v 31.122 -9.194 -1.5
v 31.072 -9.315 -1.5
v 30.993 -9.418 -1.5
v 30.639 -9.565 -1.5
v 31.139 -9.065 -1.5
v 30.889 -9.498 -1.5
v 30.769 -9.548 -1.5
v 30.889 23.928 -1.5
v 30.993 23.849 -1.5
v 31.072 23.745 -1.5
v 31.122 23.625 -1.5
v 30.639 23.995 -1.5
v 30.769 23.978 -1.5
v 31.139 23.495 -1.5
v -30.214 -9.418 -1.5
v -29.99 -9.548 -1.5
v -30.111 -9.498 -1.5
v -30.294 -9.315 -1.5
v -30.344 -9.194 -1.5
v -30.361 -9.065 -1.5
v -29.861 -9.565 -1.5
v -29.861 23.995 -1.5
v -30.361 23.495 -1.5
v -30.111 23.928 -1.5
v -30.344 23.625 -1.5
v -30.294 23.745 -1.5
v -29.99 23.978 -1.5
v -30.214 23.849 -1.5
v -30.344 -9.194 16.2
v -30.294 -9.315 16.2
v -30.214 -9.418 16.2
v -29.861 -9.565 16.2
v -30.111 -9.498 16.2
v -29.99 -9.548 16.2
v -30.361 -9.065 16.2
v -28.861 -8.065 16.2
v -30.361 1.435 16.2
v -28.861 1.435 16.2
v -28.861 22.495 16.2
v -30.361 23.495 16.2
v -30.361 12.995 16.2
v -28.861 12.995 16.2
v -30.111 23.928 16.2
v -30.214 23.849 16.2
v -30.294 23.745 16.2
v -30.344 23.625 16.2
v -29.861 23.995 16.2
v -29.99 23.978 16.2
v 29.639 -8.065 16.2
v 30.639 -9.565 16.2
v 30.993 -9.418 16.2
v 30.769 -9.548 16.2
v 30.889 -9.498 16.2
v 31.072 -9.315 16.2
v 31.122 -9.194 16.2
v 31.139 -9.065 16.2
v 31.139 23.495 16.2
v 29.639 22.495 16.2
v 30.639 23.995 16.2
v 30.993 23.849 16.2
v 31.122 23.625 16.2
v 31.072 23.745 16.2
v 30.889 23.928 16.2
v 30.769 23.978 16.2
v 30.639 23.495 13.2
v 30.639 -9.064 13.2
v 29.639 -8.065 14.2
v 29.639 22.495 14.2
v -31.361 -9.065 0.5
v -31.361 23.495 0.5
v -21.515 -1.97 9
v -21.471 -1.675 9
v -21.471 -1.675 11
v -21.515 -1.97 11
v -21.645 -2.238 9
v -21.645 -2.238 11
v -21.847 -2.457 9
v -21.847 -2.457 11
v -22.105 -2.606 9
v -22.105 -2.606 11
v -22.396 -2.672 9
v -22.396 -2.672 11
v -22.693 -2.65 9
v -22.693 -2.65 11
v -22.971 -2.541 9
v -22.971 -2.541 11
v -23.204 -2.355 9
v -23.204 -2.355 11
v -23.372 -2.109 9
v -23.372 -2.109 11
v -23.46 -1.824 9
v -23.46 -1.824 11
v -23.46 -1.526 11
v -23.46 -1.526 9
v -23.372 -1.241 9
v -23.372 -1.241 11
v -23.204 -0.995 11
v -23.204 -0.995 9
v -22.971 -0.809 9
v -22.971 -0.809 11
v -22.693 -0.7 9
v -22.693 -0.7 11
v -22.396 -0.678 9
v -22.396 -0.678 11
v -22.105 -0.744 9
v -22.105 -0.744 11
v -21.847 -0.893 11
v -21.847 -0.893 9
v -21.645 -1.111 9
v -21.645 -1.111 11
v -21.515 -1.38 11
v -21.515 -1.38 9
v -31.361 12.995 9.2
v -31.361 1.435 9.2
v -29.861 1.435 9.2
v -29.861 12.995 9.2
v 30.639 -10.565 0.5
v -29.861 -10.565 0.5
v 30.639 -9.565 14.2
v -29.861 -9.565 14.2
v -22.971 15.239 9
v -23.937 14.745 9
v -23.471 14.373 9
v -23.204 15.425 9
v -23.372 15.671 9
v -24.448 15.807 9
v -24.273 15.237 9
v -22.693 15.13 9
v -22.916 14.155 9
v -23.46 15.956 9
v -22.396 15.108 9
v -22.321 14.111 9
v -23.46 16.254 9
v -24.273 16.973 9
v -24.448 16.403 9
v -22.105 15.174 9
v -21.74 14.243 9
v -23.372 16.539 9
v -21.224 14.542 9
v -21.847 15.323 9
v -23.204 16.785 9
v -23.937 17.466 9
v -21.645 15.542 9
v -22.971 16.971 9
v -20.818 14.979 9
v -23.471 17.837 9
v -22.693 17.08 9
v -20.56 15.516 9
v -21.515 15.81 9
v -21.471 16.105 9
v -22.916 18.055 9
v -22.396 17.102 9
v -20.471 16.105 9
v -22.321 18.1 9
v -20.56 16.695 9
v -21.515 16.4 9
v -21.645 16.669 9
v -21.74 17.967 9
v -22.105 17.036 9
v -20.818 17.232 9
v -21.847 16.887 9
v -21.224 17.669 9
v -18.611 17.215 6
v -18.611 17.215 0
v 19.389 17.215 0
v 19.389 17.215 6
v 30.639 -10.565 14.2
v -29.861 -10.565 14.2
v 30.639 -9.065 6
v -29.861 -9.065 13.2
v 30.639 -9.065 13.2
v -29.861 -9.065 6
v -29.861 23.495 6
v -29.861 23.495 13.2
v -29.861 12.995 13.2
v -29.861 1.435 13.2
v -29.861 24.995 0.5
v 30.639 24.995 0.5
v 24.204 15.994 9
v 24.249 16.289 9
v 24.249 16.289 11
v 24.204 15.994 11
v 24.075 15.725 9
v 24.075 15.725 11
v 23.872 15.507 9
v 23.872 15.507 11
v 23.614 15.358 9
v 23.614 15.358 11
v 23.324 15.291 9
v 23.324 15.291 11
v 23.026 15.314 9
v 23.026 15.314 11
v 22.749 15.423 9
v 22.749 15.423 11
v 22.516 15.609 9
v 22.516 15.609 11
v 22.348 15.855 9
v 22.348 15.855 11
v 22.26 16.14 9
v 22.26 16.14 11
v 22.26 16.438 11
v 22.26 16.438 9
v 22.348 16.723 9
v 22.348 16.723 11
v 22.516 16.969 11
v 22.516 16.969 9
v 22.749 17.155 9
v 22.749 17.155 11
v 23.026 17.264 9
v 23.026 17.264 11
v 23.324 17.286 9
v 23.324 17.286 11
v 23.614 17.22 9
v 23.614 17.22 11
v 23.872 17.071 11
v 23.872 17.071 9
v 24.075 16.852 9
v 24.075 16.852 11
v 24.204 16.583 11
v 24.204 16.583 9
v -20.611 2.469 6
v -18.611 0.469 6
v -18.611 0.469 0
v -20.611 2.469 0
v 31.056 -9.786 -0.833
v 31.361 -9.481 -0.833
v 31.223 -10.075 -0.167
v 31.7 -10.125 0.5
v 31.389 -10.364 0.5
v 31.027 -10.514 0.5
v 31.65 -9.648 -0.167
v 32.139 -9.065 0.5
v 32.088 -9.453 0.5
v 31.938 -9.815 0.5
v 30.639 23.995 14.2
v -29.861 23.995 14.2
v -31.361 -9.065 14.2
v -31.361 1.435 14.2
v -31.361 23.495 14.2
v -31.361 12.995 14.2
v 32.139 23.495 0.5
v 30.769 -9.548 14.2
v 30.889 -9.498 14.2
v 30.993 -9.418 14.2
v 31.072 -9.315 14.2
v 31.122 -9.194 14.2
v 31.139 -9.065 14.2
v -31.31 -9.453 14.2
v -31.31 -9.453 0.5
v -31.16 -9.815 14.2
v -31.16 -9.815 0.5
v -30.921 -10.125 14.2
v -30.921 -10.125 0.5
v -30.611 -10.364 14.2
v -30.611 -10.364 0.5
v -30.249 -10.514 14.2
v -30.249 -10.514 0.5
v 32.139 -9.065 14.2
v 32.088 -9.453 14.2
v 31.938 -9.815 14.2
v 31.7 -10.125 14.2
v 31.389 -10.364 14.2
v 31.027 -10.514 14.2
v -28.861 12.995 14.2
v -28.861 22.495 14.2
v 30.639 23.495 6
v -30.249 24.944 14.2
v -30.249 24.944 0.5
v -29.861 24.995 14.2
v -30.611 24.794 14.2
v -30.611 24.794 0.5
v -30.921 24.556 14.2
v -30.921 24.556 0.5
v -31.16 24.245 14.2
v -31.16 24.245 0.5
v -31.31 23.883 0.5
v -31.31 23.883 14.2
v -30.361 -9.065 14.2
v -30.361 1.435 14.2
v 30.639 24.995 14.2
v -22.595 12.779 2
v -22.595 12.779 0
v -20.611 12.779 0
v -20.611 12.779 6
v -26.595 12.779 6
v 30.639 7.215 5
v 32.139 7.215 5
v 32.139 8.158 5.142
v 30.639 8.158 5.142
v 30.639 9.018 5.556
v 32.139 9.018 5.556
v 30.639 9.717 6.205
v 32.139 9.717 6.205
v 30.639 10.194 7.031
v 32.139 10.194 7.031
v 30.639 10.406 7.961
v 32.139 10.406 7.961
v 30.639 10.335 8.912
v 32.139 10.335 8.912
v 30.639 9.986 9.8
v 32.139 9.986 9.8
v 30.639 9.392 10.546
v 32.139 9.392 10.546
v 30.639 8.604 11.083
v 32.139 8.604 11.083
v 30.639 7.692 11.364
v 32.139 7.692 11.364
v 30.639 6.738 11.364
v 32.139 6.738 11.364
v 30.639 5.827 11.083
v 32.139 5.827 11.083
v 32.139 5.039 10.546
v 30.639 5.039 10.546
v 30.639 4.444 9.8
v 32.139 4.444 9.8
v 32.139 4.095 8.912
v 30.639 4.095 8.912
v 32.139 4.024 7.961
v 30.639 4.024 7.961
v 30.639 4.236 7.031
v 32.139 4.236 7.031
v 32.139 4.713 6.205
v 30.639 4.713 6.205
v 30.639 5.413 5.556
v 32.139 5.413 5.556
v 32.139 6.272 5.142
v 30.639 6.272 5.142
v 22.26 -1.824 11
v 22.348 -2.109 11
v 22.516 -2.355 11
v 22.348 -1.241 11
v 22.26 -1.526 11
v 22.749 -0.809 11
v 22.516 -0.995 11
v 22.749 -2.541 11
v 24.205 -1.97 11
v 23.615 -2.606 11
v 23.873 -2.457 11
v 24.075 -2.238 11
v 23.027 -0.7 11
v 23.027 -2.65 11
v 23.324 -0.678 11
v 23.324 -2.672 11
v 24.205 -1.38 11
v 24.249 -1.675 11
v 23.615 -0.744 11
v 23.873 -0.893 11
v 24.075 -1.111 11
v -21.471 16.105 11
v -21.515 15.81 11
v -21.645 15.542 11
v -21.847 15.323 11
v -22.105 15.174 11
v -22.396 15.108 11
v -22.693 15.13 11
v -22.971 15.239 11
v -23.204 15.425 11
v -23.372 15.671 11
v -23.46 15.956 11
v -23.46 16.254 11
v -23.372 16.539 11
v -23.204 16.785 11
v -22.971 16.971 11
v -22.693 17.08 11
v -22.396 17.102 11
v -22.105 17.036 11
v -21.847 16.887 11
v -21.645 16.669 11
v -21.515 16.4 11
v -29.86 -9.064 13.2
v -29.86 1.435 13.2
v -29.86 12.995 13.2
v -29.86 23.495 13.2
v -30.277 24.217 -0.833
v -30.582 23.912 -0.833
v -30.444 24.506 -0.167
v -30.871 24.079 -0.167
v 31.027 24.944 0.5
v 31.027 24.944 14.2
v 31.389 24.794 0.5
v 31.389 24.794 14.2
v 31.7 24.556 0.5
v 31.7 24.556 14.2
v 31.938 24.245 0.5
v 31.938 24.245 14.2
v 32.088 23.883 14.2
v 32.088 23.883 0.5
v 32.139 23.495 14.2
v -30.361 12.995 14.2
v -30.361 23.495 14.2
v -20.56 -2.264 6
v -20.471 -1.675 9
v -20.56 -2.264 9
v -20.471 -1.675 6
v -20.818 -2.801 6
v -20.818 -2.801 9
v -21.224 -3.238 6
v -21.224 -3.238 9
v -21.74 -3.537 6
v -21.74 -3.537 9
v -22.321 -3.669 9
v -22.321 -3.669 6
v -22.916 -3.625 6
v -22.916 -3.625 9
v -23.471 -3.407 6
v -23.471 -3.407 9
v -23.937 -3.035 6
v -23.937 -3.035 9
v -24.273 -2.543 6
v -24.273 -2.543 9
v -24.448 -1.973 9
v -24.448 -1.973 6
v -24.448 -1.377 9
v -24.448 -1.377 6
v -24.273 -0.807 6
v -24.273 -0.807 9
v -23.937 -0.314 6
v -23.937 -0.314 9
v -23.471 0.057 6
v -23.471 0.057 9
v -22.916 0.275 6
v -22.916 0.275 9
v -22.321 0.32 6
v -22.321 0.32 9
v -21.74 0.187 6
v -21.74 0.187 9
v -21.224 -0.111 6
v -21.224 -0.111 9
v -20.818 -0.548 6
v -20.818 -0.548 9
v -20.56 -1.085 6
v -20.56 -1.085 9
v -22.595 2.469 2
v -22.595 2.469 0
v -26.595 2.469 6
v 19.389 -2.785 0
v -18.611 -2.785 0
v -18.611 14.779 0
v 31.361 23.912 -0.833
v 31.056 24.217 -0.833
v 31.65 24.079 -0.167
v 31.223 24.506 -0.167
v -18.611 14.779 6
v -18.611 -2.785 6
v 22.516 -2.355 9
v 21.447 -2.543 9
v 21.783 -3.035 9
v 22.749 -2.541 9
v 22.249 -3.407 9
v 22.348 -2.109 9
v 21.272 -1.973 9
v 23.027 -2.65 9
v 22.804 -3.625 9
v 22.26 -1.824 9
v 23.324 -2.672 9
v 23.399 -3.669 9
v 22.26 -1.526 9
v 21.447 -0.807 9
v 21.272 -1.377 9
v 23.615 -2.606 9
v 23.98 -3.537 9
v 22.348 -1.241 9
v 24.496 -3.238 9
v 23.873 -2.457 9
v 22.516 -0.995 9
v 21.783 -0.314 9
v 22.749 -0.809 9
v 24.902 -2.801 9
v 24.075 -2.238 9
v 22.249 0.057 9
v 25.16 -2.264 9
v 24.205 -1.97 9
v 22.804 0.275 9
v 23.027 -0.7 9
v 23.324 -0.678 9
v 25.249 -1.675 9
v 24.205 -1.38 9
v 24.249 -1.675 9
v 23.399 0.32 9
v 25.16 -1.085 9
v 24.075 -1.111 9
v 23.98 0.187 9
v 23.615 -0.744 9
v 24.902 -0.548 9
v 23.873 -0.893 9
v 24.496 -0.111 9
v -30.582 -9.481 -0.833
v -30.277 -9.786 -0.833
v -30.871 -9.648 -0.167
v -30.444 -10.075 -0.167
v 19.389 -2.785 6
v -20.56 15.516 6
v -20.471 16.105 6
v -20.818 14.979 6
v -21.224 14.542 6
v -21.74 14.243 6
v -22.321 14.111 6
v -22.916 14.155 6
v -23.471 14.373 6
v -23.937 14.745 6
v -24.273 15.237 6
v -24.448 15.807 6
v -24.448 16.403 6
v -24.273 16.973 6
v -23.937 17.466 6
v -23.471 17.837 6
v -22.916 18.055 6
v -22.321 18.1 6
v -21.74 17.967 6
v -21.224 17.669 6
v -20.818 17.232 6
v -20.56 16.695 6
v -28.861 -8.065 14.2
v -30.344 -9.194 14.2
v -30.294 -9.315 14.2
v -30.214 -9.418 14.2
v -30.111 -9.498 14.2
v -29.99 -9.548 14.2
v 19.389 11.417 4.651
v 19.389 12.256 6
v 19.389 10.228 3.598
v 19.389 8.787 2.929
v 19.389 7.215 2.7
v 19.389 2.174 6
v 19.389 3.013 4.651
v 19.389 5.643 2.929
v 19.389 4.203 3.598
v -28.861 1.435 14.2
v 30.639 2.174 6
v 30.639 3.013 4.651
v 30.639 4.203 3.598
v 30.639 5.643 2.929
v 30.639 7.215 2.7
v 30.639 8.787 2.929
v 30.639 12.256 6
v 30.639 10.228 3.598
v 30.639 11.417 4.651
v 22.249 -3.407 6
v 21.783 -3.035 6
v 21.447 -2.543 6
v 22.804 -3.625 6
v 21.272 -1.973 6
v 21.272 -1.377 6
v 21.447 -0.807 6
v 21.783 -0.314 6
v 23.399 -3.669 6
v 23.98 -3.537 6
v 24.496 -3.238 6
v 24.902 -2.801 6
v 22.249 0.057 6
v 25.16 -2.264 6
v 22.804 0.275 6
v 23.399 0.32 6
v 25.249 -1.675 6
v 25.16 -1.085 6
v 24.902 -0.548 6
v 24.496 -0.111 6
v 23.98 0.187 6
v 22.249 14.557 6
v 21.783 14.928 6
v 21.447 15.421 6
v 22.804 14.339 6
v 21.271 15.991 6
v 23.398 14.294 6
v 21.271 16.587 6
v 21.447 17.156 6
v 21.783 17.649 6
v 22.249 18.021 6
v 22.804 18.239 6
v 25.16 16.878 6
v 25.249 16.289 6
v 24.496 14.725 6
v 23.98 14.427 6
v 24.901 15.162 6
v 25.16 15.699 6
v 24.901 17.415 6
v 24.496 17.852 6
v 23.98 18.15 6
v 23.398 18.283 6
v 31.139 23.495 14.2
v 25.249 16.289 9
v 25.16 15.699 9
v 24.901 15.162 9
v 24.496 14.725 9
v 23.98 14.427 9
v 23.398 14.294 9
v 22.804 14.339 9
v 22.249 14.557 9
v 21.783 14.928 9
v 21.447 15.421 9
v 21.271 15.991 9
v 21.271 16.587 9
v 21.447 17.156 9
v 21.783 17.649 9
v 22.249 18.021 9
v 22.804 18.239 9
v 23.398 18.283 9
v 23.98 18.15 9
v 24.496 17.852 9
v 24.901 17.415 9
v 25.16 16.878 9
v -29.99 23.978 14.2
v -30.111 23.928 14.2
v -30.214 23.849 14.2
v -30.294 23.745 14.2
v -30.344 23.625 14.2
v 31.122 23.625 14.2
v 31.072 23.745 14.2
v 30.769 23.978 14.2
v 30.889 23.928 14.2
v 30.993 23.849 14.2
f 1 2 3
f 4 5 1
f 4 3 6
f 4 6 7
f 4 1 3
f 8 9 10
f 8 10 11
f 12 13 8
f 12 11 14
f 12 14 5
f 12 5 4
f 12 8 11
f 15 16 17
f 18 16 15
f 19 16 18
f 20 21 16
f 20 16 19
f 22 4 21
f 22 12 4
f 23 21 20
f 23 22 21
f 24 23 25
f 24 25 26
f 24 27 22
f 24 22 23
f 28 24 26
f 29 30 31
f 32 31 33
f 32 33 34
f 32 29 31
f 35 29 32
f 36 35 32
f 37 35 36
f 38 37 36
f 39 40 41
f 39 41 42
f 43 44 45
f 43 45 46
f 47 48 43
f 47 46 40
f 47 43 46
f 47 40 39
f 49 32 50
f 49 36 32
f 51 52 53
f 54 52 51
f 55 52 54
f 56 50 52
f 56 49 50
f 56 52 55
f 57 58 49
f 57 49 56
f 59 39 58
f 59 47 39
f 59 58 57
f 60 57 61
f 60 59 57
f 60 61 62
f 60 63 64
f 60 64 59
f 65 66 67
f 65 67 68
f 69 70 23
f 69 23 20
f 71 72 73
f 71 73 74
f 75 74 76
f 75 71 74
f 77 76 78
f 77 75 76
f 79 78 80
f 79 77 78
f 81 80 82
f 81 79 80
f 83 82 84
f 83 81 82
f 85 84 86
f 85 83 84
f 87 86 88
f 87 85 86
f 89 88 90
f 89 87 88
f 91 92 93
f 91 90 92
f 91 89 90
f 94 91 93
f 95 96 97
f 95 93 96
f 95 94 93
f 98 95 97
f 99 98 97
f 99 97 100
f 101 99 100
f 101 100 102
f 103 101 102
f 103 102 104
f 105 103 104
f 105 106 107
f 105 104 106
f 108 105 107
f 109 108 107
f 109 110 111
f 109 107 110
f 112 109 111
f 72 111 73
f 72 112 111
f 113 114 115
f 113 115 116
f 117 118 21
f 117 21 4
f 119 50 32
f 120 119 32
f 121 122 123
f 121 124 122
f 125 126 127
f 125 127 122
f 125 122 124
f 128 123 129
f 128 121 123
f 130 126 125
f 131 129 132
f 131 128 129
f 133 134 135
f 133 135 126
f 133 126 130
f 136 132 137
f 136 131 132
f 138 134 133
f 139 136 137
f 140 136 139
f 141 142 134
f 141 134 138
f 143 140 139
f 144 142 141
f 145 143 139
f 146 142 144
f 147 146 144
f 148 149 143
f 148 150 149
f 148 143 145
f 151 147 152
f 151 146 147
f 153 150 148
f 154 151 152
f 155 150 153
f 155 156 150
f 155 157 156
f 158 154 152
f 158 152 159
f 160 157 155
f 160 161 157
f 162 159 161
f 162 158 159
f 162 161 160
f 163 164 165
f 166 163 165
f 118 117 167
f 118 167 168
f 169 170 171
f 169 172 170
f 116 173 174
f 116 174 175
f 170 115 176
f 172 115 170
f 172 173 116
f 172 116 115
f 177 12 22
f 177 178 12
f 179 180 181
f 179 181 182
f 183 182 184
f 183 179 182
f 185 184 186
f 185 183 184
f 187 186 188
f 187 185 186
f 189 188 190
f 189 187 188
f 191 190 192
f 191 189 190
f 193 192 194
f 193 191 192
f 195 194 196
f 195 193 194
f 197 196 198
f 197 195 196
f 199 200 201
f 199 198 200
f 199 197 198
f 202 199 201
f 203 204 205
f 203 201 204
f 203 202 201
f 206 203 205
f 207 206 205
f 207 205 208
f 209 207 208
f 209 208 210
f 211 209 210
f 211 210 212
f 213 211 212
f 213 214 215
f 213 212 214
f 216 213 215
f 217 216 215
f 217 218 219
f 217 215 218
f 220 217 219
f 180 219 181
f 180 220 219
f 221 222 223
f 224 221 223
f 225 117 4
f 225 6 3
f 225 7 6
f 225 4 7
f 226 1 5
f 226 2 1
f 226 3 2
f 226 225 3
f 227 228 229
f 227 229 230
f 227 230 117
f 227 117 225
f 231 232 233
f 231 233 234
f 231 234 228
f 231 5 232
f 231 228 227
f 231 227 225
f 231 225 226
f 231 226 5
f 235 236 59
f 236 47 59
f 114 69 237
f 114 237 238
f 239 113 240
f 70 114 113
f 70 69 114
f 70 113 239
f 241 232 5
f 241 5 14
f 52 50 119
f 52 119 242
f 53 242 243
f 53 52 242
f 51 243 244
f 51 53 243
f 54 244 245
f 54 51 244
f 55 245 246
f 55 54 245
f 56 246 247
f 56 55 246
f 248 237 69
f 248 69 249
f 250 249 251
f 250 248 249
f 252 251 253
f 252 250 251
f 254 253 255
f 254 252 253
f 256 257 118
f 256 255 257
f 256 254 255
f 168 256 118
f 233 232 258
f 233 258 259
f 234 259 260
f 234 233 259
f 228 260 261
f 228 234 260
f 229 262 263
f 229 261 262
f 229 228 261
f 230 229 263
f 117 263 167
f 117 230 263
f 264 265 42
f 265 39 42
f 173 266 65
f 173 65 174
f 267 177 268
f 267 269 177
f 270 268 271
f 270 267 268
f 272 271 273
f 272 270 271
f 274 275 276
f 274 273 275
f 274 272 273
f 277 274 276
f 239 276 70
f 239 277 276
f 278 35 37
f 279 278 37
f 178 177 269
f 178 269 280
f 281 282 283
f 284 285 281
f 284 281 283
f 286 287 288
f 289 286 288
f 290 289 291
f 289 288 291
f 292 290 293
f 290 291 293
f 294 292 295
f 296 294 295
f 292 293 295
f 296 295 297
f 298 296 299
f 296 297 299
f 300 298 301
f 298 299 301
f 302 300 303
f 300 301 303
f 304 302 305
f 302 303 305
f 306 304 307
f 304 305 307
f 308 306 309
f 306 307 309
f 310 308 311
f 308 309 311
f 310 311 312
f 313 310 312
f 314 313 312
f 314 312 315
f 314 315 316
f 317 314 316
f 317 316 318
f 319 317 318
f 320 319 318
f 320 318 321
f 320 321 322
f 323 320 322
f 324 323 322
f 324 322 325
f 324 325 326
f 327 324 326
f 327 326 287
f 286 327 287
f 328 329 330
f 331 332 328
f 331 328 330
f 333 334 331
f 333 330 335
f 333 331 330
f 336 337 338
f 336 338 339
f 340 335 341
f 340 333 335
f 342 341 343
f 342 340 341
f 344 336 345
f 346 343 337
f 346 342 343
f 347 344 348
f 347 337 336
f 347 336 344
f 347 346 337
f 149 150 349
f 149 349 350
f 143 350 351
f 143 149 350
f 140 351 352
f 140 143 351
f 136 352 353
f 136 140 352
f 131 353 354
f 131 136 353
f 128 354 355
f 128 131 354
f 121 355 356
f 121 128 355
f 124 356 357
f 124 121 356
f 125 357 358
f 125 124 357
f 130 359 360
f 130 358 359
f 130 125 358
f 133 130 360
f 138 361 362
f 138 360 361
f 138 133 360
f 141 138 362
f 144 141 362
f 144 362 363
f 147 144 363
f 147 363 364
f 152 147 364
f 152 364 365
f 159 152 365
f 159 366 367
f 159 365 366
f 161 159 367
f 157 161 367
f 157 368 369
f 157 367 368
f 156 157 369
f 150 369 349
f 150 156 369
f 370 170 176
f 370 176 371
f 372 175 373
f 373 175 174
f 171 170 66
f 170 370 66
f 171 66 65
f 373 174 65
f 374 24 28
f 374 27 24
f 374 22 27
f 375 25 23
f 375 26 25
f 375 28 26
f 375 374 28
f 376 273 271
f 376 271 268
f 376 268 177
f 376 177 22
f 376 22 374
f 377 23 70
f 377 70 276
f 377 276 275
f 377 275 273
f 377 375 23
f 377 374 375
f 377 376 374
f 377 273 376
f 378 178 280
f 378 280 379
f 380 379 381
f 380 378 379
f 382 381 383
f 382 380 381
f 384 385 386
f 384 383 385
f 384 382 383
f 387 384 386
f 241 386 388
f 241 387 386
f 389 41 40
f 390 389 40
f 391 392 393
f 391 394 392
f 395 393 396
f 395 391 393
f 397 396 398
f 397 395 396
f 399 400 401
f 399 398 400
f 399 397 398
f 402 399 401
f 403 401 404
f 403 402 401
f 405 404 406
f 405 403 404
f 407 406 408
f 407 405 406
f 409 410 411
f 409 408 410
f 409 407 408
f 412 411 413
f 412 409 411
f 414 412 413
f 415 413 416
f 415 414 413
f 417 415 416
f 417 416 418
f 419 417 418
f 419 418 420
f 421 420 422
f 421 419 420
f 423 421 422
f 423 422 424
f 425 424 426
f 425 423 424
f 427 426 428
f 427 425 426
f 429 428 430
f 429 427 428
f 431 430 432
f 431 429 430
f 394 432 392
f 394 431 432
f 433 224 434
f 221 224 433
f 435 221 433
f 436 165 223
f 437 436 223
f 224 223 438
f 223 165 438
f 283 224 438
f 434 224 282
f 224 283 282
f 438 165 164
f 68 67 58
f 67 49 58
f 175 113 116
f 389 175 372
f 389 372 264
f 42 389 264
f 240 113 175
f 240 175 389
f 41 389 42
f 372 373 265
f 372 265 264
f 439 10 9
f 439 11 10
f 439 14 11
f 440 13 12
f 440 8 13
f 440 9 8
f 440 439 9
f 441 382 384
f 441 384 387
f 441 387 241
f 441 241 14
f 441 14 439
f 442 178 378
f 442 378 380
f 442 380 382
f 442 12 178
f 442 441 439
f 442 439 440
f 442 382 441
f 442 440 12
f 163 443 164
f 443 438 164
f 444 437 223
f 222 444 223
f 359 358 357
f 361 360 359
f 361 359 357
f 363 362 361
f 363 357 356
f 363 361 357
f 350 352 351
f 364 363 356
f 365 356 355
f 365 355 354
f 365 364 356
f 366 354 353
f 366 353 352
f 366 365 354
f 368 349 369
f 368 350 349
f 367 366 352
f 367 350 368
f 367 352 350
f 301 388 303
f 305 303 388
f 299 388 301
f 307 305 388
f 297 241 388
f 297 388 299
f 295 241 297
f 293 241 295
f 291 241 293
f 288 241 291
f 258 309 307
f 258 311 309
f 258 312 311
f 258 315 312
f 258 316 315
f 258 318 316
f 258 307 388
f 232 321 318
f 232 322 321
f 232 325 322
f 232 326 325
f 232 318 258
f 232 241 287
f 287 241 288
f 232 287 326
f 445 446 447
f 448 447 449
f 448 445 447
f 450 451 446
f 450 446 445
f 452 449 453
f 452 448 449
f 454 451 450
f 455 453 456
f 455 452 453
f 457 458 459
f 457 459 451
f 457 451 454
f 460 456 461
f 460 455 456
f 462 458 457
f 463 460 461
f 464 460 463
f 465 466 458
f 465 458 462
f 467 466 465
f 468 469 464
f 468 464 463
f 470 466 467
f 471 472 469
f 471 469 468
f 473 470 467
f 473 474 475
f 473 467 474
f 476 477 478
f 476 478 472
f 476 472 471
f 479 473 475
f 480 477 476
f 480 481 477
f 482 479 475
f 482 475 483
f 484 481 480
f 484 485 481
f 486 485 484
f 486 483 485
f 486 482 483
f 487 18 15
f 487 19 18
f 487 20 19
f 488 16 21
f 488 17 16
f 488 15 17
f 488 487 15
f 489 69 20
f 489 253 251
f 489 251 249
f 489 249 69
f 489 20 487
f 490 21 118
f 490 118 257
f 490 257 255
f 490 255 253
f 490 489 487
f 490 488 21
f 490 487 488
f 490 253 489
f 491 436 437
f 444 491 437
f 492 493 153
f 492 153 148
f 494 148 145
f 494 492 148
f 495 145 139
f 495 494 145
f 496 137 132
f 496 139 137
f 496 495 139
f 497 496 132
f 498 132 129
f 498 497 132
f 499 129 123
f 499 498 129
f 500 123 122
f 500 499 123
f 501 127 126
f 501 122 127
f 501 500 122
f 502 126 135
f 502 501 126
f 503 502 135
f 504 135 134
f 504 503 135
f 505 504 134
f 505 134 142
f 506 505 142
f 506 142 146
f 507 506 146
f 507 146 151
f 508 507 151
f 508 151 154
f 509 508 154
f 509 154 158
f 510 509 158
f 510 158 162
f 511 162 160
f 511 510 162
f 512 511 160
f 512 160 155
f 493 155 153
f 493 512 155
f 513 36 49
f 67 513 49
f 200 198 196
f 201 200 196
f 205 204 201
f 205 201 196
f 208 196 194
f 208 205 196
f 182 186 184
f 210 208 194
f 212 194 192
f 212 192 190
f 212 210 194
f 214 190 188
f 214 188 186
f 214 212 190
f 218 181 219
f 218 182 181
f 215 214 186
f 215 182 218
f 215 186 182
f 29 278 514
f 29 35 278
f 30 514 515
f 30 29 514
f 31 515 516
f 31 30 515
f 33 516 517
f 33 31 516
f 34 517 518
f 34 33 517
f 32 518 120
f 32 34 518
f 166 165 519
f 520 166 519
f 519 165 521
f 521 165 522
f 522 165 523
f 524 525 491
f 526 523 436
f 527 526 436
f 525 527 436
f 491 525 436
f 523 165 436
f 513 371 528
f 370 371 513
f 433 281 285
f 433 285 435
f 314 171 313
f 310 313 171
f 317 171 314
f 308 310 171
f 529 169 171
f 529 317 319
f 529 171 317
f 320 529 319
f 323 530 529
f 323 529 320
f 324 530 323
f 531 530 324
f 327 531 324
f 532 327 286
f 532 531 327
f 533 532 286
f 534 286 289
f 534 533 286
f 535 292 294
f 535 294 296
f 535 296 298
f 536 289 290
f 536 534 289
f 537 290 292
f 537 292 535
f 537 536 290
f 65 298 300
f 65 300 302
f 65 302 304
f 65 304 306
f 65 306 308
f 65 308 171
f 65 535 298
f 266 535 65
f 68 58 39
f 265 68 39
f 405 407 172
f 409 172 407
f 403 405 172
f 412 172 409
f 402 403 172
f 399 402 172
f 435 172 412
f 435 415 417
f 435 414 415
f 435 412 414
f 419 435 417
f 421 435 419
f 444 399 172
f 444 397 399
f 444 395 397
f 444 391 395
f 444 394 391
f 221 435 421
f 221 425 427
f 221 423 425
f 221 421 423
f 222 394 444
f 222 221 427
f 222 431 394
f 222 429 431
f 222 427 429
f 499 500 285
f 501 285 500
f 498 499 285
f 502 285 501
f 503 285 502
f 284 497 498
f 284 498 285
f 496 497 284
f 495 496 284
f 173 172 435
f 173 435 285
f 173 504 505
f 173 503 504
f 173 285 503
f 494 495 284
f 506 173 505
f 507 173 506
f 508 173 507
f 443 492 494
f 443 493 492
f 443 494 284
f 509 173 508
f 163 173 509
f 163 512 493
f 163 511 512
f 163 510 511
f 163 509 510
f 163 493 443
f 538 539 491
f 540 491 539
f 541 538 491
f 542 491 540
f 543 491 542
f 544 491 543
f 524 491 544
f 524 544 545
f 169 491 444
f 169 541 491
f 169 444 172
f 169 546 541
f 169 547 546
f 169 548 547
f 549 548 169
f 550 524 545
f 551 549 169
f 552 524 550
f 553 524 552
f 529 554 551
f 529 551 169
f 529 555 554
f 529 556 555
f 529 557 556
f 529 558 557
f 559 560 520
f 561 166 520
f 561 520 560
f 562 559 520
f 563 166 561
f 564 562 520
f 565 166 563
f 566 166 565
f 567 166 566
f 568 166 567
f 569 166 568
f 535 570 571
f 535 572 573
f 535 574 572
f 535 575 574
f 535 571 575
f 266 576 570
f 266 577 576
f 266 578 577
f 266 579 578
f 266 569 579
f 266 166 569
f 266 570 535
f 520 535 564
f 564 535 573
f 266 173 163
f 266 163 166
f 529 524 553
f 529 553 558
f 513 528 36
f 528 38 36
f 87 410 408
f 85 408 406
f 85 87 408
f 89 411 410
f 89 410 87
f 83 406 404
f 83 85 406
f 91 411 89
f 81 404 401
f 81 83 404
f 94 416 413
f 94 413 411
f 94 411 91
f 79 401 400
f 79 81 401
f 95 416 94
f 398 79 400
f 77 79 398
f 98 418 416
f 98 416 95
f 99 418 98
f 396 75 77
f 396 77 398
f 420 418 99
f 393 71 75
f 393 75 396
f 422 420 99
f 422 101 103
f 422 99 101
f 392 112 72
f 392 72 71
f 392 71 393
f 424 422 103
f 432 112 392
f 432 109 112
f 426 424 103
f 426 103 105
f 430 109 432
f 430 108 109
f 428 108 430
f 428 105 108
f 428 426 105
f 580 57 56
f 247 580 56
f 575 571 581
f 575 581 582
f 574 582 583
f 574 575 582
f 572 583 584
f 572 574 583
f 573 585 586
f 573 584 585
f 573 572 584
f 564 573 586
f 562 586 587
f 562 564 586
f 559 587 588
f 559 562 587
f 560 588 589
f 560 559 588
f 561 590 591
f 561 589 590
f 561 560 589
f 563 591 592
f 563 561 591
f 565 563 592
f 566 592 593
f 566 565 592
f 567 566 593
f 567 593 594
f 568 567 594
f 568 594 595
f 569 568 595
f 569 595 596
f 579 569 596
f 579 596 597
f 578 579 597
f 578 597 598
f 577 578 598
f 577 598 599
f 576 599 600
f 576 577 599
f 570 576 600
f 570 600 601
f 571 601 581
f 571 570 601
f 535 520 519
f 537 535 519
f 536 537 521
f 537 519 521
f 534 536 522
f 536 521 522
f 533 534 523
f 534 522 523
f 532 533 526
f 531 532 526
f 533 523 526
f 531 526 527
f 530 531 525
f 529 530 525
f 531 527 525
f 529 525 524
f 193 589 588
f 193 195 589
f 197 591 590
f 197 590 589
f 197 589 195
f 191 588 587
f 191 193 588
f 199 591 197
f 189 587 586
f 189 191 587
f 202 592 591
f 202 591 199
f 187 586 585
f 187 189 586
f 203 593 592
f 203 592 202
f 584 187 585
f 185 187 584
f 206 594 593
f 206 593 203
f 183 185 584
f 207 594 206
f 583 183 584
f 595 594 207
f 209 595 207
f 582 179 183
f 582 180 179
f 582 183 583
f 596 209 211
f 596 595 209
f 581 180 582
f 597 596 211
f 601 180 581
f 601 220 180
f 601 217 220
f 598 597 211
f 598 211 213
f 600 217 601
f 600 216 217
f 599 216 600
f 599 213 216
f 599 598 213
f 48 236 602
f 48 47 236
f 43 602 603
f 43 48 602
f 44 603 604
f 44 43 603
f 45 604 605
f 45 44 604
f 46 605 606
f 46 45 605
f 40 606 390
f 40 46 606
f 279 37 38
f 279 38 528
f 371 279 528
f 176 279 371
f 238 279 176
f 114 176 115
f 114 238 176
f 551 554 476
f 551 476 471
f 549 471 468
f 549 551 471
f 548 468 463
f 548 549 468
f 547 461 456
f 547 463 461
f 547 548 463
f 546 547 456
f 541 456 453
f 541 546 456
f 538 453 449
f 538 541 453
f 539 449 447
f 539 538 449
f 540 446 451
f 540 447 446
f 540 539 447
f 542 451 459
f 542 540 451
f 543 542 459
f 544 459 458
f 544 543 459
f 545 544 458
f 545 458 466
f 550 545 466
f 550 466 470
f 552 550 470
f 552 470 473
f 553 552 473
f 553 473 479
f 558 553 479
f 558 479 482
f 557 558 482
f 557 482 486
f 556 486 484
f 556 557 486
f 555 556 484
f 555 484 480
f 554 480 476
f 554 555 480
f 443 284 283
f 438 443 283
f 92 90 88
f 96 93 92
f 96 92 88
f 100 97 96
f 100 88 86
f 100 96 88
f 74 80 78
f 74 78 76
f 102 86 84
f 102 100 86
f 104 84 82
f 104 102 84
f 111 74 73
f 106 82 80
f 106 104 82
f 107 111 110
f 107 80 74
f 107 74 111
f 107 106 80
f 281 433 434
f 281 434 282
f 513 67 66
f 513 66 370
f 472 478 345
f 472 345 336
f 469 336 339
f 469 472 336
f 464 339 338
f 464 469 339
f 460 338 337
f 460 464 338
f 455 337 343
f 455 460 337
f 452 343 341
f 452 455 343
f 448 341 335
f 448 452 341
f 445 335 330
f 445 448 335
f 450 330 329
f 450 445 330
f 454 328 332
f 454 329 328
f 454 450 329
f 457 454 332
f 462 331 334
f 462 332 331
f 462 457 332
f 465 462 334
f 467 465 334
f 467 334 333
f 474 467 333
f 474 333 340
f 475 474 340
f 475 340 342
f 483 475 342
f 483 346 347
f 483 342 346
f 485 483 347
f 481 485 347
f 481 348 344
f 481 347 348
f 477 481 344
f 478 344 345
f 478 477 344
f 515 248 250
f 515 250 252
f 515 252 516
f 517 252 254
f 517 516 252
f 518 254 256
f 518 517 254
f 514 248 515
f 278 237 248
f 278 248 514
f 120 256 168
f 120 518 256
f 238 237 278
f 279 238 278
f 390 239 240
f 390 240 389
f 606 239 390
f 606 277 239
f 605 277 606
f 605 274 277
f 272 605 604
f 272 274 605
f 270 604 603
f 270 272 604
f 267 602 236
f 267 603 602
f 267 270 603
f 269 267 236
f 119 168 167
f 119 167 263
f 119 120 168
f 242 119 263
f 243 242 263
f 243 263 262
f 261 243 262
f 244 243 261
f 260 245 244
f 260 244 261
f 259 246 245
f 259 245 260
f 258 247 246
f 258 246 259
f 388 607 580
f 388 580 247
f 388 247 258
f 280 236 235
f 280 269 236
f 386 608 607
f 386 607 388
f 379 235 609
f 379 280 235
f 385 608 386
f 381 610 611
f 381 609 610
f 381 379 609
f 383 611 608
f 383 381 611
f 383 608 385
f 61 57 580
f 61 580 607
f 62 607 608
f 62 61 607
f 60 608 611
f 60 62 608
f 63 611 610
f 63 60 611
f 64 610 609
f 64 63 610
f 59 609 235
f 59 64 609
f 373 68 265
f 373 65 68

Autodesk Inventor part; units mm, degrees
ref_plane "YZ Plane" through (0, 0, 0) normal (1, 0, 0) x (0, 1, 0)
ref_plane "XZ Plane" through (0, 0, 0) normal (0, 1, 0) x (-1, 0, 0)
ref_plane "XY Plane" through (0, 0, 0) normal (0, 0, 1) x (1, 0, 0)
sketch "Sketch1" plane through (0, 0, 0) normal (0, 0, 1) x (1, 0, 0)
  line L0 (-31.3608, 24.9952) -> (32.1392, 24.9952)
  line L1 (32.1392, 24.9952) -> (32.1392, -10.5648)
  line L2 (32.1392, -10.5648) -> (-31.3608, -10.5648)
  line L3 (-31.3608, -10.5648) -> (-31.3608, 24.9952)
  line L4 (30.6392, 23.4952) -> (-29.8608, 23.4952)
  line L5 (-29.8608, 23.4952) -> (-29.8608, -9.0648)
  line L6 (-29.8608, -9.0648) -> (30.6392, -9.0648)
  line L7 (30.6392, -9.0648) -> (30.6392, 23.4952)
  point P0 (0, 0)
  dimension "d0" = 63.5
  dimension "d1" = 35.56
  dimension "d2" = 1.5
extrude "Extrusion1" add sketch "Sketch1" along normal blind 16.2
sketch "Sketch2" plane through (0, 0, 0) normal (0, 0, -1) x (-1, 0, 0)
  line L0 (-32.1392, -10.5648) -> (31.3608, -10.5648) projected
  line L1 (31.3608, -10.5648) -> (31.3608, 24.9952) projected
  line L2 (31.3608, 24.9952) -> (-32.1392, 24.9952) projected
  line L3 (-32.1392, 24.9952) -> (-32.1392, -10.5648) projected
  point P0 (0, 0)
extrude "Extrusion2" add sketch "Sketch2" along normal blind 1.5
sketch "Sketch3" plane through (0, 0, 0) normal (0, 0, 1) x (1, 0, 0)
  line L0 (-18.6108, 17.2152) -> (19.3892, 17.2152)
  line L1 (19.3892, 17.2152) -> (19.3892, -2.7848)
  line L2 (19.3892, -2.7848) -> (-18.6108, -2.7848)
  line L3 (-18.6108, -2.7848) -> (-18.6108, 17.2152)
  line L4 (30.6392, -9.0648) -> (-29.8608, -9.0648) projected
  line L5 (-29.8608, 23.4952) -> (30.6392, 23.4952) projected
  line L6 (30.6392, 23.4952) -> (30.6392, -9.0648) projected
  line L7 (30.6392, -9.0648) -> (30.6392, 23.4952) projected
  line L8 (30.6392, 23.4952) -> (-29.8608, 23.4952) projected
  line L9 (-29.8608, 23.4952) -> (-29.8608, -9.0648) projected
  line L10 (-29.8608, -9.0648) -> (30.6392, -9.0648) projected
  point P0 (0, 0)
  dimension "d7" = 38
  dimension "d8" = 20
  dimension "d9" = 6.28
  dimension "d10" = 32.56
  dimension "d11" = 11.25
  dimension "d12" = 60.5
extrude "Extrusion3" add sketch "Sketch3" along normal blind 6
sketch "Sketch4" plane through (0, 0, 6) normal (0, 0, 1) x (1, 0, 0)
  circle A0 centre (-22.4708, 16.1052) radius 1
  circle A1 centre (-22.4708, -1.6748) radius 1
  circle A2 centre (23.2492, -1.6748) radius 1
  circle A3 centre (23.2489, 16.2887) radius 1
  line L0 (30.6392, -9.0648) -> (-29.8608, -9.0648) projected
  line L1 (-29.8608, 23.4952) -> (30.6392, 23.4952) projected
  line L2 (-29.8608, -9.0648) -> (-29.8608, 23.4952) projected
  point P0 (0, 0)
  dimension "d15" = 2
  dimension "d16" = 2
  dimension "d17" = 2
  dimension "d18" = 2
  dimension "d19" = 45.72
  dimension "d20" = 45.72
  dimension "d21" = 17.78
  dimension "d22" = 7.39
  dimension "d23" = 32.56
  dimension "d24" = 60.5
  dimension "d25" = 7.39
  dimension "d26" = 0
extrude "Extrusion4" add sketch "Sketch4" along normal blind 5
sketch "Sketch5" plane through (0, 0, 6) normal (0, 0, 1) x (1, 0, 0)
  circle A0 centre (-22.4708, 16.1052) radius 1 projected
  circle A1 centre (-22.4708, -1.6748) radius 1 projected
  circle A2 centre (23.2492, -1.6748) radius 1 projected
  circle A3 centre (23.2489, 16.2887) radius 1 projected
  circle A4 centre (-22.4708, 16.1052) radius 2
  circle A5 centre (-22.4708, -1.6748) radius 2
  circle A6 centre (23.2492, -1.6748) radius 2
  circle A7 centre (23.2489, 16.2887) radius 2
  point P0 (0, 0)
  dimension "d29" = 1
  dimension "d30" = 1
  dimension "d31" = 1
  dimension "d32" = 1
extrude "Extrusion5" add sketch "Sketch5" along normal blind 3
fillet "Fillet1" radius 1.5 4 edges at (-31.3608, -10.5648, 7.35) (32.1392, -10.5648, 7.35) (32.1392, 24.9952, 7.35) (-31.3608, 24.9952, 7.35)
sketch "Sketch6" plane through (32.1392, -9.0648, 16.2) normal (1, 0, 0) x (0, 0, -1)
  circle A0 centre (8, 16.28) radius 3.2
  line L0 (0, 0) -> (0, 32.56) projected
  line L1 (0, -1.5) -> (17.7, -1.5) projected
  line L2 (17.7, 34.06) -> (0, 34.06) projected
  point P0 (16.2, 9.0648)
  dimension "d36" = 6.4
  dimension "d37" = 8
  dimension "d38" = 17.78
  dimension "d39" = 35.56
extrude "Extrusion6" cut sketch "Sketch6" against normal up to surface (12.75 mm away)
sketch "Sketch7" plane through (19.3892, -2.7848, 0) normal (-1, 0, 0) x (0, 0, 1)
  arc A0 (6, 12.3238) -> (6, 7.6762) centre (8.2, 10) ccw projected
  circle A1 centre (8.2, 10) radius 5.5
  point P0 (0, 2.7848)
  dimension "d42" = 11
extrude "Extrusion7" cut sketch "Sketch7" against normal up to surface (11.25 mm away)
sketch "Sketch8" plane through (0, 0, 6) normal (0, 0, 1) x (1, 0, 0)
  line L0 (-18.6108, -2.7848) -> (-18.6108, 17.2152) projected
  line L1 (-18.6108, 2.4694) -> (-22.595, 2.4694)
  line L2 (-22.595, 2.4694) -> (-22.595, 12.7792)
  line L3 (-22.595, 12.7792) -> (-18.6108, 12.7792)
  line L4 (-18.6108, 12.7792) -> (-18.6108, 2.4694)
  point P0 (0, 0)
extrude "Extrusion8" cut sketch "Sketch8" against normal up to surface (6 mm away)
chamfer "Chamfer1" distance 2 angle 45 2 edges at (-18.6108, 2.4694, 3) (-18.6108, 12.7792, 3)
chamfer "Chamfer2" distance 4 angle 45 1 edges at (-22.595, 7.6243, 6)
sketch "Sketch9" plane through (0, 0, 16.2) normal (0, 0, 1) x (1, 0, 0)
  line L0 (-29.8608, 23.4952) -> (30.6392, 23.4952) projected
  line L1 (-29.8608, -9.0648) -> (-29.8608, 23.4952) projected
  line L2 (30.6392, -9.0648) -> (-29.8608, -9.0648) projected
  line L3 (30.6392, 23.4952) -> (30.6392, -9.0648) projected
  line L4 (29.6392, 22.4952) -> (-28.8608, 22.4952)
  line L5 (-28.8608, 22.4952) -> (-28.8608, -8.0648)
  line L6 (-28.8608, -8.0648) -> (29.6392, -8.0648)
  line L7 (29.6392, -8.0648) -> (29.6392, 22.4952)
  point P0 (0, 0)
  dimension "d53" = 1
extrude "Extrusion9" add sketch "Sketch9" against normal blind 3
chamfer "Chamfer3" distance 1 angle 45 4 edges at (-28.8608, 7.2152, 13.2) (0.3892, 22.4952, 13.2) (0.3892, -8.0648, 13.2) (29.6392, 7.2152, 13.2)
sketch "Sketch10" plane through (0, 0, 16.2) normal (0, 0, 1) x (1, 0, 0)
  line L0 (30.6392, 24.9952) -> (-29.8608, 24.9952) projected
  arc A0 (-29.8608, 24.9952) -> (-31.3608, 23.4952) centre (-29.8608, 23.4952) ccw projected
  line L1 (-31.3608, 23.4952) -> (-31.3608, -9.0648) projected
  arc A1 (-31.3608, -9.0648) -> (-29.8608, -10.5648) centre (-29.8608, -9.0648) ccw projected
  line L2 (-29.8608, -10.5648) -> (30.6392, -10.5648) projected
  arc A2 (30.6392, -10.5648) -> (32.1392, -9.0648) centre (30.6392, -9.0648) ccw projected
  line L3 (32.1392, -9.0648) -> (32.1392, 23.4952) projected
  arc A3 (32.1392, 23.4952) -> (30.6392, 24.9952) centre (30.6392, 23.4952) ccw projected
  line L4 (-29.8608, 23.9952) -> (30.6392, 23.9952)
  arc A4 (31.1392, 23.4952) -> (30.6392, 23.9952) centre (30.6392, 23.4952) ccw
  line L5 (31.1392, 23.4952) -> (31.1392, -9.0648)
  arc A5 (30.6392, -9.5648) -> (31.1392, -9.0648) centre (30.6392, -9.0648) ccw
  line L6 (30.6392, -9.5648) -> (-29.8608, -9.5648)
  arc A6 (-30.3608, -9.0648) -> (-29.8608, -9.5648) centre (-29.8608, -9.0648) ccw
  line L7 (-30.3608, -9.0648) -> (-30.3608, 23.4952)
  arc A7 (-29.8608, 23.9952) -> (-30.3608, 23.4952) centre (-29.8608, 23.4952) ccw
  point P0 (0, 0)
  dimension "d59" = 1
extrude "Extrusion10" cut sketch "Sketch10" against normal blind 2
sketch "Sketch11" plane through (-31.3608, -9.0648, -1.5) normal (-1, 0, 0) x (0, 0, 1)
  line L0 (17.7, 32.56) -> (17.7, 0) projected
  line L1 (10.7, 22.06) -> (17.7, 22.06)
  line L2 (17.7, 22.06) -> (17.7, 10.5)
  line L3 (17.7, 10.5) -> (10.7, 10.5)
  line L4 (10.7, 10.5) -> (10.7, 22.06)
  line L5 (15.7, 34.06) -> (0, 34.06) projected
  line L6 (0, -1.5) -> (15.7, -1.5) projected
  point P0 (1.5, 9.0648)
  dimension "d62" = 12
  dimension "d63" = 12
  dimension "d64" = 7
extrude "Extrusion11" cut sketch "Sketch11" against normal up to surface (2.5 mm away)
chamfer "Chamfer4" distance 1 distance2 2 8 edges at (0.3892, -10.5648, -1.5) (-30.9214, -10.1255, -1.5) (-31.3608, 7.2152, -1.5) (-30.9214, 24.5559, -1.5) (0.3892, 24.9952, -1.5) (31.6999, 24.5559, -1.5) (32.1392, 7.2152, -1.5) (31.6999, -10.1255, -1.5) measured on face at (-9.6941, 13.1419, -1.5)
equation "\"d9\" = -0.5 * d8 + 0.5 * d10"
equation "\"d11\" = -0.5 * d7 + 0.5 * d12"
equation "\"d20\" = d19"
equation "\"d22\" = -0.5 * d21 + 0.5 * d23"
equation "\"d25\" = -0.5 * d19 + 0.5 * d24"
equation "\"d38\" = 0.5 * d39"
properties part number "NodeEnclosure"
